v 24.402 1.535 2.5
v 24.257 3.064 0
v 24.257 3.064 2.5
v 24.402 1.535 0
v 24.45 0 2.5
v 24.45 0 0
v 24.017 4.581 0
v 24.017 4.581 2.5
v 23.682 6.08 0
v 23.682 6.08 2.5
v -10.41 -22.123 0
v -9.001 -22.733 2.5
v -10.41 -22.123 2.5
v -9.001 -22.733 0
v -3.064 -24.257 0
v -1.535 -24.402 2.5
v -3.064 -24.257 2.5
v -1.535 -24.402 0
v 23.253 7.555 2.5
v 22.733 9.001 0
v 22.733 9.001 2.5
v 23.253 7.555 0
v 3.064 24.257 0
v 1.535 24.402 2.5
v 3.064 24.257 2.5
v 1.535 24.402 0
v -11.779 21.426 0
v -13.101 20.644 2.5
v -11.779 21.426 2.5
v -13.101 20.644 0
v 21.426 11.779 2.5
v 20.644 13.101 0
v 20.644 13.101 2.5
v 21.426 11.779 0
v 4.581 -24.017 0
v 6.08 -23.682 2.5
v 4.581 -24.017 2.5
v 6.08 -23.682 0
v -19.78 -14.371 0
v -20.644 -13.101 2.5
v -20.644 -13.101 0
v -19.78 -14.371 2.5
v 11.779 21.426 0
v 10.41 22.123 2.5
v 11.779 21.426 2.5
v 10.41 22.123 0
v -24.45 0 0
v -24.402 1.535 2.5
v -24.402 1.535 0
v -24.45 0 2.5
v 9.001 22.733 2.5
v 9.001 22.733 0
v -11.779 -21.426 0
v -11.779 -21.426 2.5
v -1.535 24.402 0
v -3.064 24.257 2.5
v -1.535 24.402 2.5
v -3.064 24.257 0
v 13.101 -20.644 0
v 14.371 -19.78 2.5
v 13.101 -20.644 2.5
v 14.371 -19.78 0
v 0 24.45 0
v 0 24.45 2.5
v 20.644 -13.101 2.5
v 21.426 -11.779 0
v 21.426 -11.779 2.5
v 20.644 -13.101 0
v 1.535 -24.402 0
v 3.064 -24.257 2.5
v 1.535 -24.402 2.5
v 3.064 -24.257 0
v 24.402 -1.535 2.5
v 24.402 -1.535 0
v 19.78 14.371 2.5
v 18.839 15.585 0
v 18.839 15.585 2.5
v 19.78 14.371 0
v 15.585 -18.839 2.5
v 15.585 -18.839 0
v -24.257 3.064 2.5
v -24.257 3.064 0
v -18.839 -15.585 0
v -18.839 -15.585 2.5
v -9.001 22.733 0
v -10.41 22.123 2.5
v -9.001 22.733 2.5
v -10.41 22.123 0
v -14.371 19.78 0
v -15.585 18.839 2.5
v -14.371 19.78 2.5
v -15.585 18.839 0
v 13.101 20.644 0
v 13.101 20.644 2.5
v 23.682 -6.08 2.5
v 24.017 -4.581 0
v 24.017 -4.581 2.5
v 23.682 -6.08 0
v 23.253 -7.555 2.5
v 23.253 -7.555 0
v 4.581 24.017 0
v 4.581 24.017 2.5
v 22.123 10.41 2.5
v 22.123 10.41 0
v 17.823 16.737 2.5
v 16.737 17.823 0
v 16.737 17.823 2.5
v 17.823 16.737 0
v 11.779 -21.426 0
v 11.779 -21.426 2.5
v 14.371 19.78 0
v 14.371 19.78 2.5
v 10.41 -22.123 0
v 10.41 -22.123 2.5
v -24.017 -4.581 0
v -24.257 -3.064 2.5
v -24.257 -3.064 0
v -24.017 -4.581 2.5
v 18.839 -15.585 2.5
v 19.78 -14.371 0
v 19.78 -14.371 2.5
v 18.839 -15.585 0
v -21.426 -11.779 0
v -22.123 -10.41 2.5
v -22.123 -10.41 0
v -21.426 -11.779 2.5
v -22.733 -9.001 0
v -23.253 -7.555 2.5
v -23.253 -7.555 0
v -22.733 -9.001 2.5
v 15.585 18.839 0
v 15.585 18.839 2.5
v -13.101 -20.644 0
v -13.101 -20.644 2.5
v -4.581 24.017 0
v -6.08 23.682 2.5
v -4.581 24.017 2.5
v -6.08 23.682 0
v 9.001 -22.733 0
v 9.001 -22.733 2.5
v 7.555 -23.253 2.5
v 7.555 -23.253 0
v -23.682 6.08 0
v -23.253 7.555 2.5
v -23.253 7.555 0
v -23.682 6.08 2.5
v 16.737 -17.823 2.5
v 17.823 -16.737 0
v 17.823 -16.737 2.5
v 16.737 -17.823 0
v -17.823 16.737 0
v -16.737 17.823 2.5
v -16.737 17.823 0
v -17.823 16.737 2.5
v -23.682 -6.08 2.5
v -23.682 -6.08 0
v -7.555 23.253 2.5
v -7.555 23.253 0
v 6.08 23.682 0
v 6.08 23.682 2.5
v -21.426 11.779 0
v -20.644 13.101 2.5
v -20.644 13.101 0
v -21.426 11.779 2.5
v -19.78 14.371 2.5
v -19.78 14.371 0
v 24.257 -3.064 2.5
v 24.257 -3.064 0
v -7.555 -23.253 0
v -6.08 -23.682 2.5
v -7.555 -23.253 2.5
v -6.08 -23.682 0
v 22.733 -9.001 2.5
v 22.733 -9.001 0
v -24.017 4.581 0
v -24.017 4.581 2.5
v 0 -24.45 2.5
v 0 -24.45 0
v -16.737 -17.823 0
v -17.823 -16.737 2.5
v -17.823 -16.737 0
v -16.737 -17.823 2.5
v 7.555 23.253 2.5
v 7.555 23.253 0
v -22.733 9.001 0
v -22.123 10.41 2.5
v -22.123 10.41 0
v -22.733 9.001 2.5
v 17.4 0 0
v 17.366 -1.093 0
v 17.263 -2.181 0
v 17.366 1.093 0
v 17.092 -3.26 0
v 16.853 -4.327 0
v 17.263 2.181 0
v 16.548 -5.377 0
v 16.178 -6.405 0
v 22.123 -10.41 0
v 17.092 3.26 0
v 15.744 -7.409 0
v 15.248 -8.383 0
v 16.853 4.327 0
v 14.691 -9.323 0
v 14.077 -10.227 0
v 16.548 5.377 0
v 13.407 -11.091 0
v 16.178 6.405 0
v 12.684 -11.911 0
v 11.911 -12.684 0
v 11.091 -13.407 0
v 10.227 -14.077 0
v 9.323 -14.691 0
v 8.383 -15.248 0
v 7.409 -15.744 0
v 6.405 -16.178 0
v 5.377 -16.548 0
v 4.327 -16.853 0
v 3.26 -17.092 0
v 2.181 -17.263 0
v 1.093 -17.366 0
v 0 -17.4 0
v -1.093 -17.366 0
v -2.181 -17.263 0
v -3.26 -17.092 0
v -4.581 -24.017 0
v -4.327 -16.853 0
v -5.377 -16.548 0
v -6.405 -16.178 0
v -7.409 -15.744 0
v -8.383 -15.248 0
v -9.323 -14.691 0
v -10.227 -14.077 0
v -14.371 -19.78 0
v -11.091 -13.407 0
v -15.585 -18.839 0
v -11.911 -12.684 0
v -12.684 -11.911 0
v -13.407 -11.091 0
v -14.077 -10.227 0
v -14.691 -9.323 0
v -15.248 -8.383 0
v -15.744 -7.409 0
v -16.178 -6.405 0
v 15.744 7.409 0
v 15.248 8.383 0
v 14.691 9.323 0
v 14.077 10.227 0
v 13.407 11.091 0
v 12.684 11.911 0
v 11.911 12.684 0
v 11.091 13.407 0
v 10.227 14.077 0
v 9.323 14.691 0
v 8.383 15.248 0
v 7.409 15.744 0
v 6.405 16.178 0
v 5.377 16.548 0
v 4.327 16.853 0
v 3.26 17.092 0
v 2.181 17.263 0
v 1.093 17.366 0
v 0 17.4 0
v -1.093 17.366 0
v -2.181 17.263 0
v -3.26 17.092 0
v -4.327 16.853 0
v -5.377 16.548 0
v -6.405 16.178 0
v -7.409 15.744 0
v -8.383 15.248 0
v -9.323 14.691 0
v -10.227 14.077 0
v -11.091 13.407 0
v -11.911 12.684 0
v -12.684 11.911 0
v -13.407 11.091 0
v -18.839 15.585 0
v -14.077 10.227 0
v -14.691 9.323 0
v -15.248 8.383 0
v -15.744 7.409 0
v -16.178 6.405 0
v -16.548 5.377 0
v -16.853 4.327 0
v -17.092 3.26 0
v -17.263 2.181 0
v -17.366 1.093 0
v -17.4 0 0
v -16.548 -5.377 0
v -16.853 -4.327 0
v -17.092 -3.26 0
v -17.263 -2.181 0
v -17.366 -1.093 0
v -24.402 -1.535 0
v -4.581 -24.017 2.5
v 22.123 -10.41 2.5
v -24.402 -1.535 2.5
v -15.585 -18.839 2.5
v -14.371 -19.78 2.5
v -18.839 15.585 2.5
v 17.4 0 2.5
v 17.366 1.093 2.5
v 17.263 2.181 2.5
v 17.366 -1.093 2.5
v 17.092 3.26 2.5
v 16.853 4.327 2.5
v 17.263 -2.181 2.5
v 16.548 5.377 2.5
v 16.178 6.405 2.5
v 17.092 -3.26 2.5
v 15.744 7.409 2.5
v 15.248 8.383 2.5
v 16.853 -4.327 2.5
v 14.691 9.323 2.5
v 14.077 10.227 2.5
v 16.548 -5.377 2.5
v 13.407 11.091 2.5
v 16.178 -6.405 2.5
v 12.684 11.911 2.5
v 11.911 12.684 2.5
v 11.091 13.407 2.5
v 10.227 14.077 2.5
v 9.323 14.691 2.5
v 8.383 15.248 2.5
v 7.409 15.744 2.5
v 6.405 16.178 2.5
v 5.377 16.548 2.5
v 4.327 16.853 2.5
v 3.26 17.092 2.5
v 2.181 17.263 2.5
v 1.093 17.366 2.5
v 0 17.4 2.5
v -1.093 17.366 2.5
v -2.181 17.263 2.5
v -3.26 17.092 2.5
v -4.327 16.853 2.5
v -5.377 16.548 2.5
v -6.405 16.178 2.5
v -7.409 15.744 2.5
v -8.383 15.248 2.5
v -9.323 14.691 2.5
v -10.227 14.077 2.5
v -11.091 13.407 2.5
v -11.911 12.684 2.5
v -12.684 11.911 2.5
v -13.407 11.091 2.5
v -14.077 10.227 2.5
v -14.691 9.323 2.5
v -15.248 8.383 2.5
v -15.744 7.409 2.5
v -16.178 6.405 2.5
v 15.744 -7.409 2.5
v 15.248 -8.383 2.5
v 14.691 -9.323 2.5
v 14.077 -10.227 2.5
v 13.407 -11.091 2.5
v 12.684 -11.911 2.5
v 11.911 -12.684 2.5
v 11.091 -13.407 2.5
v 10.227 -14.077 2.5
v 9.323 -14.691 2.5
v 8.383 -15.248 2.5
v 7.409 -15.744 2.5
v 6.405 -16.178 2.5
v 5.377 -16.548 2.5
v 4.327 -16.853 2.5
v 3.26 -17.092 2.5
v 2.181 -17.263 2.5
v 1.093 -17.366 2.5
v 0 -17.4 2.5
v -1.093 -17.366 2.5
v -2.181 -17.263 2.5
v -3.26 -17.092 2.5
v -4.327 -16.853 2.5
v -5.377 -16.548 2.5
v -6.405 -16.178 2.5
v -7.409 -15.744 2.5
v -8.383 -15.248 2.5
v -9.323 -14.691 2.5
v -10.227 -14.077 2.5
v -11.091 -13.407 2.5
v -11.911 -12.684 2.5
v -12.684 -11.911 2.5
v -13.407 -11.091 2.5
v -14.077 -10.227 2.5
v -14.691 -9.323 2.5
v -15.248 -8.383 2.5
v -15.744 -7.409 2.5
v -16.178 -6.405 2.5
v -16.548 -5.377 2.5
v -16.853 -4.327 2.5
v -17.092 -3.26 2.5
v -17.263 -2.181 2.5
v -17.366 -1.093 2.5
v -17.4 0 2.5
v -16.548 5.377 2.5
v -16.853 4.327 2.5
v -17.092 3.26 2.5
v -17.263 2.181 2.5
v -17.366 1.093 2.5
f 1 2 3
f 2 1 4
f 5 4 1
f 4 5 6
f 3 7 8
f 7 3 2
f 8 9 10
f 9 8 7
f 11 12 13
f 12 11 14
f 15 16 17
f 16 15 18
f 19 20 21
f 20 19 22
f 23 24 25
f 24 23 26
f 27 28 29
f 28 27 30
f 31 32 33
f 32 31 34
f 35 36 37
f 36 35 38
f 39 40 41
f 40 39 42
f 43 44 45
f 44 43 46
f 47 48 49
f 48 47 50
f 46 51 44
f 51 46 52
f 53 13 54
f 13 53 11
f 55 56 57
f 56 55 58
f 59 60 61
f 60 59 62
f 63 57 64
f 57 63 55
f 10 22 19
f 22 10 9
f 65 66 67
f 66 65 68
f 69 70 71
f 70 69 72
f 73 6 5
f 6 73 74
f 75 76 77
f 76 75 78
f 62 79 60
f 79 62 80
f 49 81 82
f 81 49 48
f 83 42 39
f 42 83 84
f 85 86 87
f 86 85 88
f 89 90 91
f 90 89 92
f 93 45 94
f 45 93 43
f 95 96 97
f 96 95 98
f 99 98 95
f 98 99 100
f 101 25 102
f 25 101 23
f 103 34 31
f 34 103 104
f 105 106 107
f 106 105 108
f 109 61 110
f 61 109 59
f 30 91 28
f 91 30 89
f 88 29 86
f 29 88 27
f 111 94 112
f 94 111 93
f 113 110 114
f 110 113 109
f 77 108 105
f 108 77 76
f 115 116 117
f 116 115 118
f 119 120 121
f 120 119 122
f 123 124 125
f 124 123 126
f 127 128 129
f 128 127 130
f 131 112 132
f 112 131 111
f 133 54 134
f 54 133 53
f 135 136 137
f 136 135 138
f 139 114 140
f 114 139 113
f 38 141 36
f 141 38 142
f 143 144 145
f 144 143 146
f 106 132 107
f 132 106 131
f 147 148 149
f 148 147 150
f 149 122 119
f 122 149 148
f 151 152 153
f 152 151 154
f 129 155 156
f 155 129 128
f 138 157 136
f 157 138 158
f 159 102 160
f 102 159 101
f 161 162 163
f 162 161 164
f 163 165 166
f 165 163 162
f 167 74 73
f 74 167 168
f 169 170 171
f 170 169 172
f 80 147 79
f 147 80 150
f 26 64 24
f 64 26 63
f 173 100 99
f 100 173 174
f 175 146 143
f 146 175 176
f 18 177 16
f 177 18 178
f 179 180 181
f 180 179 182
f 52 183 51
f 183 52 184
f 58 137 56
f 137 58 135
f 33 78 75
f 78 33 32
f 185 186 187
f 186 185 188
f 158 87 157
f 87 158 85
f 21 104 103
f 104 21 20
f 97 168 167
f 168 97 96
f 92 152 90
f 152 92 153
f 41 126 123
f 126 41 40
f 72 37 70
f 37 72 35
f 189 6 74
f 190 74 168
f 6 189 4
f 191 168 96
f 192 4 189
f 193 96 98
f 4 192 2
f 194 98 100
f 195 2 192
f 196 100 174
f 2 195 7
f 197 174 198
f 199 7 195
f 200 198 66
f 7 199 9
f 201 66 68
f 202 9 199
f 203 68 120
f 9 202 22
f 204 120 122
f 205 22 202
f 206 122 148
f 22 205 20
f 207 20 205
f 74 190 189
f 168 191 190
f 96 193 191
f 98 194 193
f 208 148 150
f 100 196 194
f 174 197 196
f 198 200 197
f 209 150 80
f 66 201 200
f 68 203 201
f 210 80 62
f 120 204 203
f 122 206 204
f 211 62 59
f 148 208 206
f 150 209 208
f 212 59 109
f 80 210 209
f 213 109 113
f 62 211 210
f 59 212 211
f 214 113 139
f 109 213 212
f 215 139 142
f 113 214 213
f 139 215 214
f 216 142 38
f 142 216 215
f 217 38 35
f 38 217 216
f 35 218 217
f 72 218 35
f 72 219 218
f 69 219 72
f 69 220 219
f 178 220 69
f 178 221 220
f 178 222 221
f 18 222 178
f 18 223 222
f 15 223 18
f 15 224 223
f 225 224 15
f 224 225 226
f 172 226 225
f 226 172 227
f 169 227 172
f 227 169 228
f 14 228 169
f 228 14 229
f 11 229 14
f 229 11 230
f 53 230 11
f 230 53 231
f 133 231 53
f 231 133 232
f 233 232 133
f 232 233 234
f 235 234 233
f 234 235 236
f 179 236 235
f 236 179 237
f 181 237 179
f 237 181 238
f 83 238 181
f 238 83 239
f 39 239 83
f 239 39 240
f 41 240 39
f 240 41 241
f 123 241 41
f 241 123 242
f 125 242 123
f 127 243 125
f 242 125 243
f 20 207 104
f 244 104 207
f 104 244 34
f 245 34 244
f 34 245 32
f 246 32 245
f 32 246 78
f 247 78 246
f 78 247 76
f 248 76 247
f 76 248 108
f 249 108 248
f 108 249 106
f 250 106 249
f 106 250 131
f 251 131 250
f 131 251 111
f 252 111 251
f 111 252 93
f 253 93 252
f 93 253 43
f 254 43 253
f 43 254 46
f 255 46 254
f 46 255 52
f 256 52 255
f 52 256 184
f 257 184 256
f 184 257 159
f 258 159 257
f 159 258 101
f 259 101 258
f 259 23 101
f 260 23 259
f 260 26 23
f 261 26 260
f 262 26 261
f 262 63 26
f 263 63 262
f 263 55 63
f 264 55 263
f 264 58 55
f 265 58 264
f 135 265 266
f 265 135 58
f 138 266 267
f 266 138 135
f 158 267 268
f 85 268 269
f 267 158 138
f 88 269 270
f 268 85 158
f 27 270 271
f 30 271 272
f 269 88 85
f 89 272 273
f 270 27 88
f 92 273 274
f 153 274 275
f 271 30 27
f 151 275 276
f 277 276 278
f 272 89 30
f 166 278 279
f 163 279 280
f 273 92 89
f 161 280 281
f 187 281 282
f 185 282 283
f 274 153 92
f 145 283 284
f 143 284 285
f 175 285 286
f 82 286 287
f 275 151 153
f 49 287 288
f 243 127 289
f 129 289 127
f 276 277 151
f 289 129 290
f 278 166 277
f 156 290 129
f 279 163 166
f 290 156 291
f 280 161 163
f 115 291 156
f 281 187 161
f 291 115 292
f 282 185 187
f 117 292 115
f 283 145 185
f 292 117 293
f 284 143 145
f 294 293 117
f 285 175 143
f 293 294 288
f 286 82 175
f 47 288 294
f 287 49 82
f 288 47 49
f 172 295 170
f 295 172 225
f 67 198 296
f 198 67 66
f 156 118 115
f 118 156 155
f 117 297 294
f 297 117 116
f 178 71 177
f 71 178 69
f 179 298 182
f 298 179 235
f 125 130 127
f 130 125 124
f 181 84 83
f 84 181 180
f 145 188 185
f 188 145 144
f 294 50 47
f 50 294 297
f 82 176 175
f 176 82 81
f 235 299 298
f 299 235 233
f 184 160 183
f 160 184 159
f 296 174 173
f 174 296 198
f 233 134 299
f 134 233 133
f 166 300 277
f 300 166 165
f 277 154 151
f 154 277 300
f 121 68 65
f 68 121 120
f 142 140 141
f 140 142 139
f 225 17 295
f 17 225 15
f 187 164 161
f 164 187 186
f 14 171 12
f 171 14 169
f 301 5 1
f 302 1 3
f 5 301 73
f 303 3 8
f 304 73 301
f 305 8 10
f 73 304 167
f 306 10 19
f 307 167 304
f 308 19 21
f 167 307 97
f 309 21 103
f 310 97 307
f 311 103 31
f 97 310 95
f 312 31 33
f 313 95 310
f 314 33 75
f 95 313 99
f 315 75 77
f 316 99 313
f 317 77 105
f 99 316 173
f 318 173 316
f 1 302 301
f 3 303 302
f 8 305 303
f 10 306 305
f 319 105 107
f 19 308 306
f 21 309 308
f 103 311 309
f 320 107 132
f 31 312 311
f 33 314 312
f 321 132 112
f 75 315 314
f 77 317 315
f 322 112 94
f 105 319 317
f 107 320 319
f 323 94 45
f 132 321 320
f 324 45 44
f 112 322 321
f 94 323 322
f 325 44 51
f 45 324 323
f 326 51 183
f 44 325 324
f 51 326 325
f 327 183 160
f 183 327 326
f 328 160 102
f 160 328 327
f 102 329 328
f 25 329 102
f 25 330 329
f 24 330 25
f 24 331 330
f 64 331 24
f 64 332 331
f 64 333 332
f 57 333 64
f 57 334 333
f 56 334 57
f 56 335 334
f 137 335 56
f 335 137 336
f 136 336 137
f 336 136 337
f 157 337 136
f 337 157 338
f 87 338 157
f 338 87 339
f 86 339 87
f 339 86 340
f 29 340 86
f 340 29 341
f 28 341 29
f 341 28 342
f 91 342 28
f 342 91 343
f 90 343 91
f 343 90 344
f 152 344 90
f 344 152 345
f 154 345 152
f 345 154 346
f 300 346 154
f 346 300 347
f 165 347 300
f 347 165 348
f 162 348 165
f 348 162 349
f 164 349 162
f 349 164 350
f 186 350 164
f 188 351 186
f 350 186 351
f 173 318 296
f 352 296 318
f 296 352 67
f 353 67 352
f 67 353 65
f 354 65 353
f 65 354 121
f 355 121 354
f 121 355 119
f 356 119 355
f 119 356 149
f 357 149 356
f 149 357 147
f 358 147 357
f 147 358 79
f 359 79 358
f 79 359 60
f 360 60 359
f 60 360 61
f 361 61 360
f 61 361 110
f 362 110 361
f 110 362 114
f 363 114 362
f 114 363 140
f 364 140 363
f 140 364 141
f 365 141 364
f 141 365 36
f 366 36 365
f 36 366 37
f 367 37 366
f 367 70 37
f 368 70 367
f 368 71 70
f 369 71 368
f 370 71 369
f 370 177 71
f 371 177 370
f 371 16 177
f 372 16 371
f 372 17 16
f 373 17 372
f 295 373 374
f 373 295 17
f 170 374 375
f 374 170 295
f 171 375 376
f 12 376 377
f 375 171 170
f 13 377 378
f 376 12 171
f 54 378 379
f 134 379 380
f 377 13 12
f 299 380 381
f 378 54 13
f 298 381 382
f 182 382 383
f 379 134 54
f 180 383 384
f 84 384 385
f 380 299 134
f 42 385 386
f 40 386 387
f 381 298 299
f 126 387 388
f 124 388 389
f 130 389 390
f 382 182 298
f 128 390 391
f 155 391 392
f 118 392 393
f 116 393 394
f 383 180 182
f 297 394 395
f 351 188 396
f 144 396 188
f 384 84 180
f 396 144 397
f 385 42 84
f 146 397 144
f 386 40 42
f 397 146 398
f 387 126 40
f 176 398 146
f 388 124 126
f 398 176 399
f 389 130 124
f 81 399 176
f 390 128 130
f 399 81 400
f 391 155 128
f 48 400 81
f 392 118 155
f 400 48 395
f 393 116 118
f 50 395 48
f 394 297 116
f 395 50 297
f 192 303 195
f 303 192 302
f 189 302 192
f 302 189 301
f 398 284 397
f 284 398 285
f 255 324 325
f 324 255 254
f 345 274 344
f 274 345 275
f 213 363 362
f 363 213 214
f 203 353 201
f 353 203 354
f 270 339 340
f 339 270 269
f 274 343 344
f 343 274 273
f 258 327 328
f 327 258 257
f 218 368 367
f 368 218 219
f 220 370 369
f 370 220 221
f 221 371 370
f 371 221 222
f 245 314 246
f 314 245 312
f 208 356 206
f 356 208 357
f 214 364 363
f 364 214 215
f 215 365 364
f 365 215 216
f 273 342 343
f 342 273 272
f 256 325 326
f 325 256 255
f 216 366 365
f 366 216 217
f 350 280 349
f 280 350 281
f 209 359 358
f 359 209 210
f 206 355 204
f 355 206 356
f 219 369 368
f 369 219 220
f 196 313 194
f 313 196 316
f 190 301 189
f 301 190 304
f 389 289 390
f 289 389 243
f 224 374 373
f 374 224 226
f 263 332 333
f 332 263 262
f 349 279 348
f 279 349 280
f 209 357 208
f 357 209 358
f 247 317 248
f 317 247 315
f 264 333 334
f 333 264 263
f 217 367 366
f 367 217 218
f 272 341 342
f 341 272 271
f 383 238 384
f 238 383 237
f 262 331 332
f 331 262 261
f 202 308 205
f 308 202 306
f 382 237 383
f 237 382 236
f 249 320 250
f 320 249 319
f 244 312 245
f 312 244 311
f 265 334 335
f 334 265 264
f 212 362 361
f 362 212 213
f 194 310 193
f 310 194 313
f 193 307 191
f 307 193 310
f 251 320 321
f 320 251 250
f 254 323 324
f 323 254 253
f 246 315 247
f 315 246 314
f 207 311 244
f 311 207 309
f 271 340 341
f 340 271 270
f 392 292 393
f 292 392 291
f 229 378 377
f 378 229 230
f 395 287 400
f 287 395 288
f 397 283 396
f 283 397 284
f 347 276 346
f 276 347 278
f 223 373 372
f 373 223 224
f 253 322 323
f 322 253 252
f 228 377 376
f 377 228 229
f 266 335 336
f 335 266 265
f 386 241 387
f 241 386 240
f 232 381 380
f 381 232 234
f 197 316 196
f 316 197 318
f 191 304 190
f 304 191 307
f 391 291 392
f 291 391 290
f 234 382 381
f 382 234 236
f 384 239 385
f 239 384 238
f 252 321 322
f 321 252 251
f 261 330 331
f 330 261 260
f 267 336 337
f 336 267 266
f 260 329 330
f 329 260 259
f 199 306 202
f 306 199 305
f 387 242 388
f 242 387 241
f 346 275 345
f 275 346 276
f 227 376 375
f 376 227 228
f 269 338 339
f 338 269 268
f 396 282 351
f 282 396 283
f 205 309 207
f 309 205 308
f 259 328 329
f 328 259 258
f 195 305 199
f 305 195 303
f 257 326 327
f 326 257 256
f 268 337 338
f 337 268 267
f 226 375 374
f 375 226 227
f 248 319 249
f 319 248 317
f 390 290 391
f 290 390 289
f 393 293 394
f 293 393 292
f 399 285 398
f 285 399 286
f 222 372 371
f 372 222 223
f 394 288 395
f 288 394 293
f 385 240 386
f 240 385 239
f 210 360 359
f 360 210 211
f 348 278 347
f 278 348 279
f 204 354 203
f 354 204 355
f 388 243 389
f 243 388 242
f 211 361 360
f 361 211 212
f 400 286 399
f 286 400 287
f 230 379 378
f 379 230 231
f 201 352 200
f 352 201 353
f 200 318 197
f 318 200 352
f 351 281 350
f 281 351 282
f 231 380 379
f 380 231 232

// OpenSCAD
/*
Description: As it looks like Trucore hardware is no longer available, this is an attempt to model the truCore motors so that rocketers can get spare parts with help from a machinist
Author: Boris du Reau
Date: 23/07/2018
motor type: 54 mm 
part: Washer
This is used for all the 54mm motors
washer outside diameter: 48.90 mm
washer height: 2.5 mm
washer inside diameter: 34.80 mm
*/
$fn=100;
difference () {cylinder (r= 48.90/2, h = 2.5);
cylinder (r=34.80/2, h = 10);
}
